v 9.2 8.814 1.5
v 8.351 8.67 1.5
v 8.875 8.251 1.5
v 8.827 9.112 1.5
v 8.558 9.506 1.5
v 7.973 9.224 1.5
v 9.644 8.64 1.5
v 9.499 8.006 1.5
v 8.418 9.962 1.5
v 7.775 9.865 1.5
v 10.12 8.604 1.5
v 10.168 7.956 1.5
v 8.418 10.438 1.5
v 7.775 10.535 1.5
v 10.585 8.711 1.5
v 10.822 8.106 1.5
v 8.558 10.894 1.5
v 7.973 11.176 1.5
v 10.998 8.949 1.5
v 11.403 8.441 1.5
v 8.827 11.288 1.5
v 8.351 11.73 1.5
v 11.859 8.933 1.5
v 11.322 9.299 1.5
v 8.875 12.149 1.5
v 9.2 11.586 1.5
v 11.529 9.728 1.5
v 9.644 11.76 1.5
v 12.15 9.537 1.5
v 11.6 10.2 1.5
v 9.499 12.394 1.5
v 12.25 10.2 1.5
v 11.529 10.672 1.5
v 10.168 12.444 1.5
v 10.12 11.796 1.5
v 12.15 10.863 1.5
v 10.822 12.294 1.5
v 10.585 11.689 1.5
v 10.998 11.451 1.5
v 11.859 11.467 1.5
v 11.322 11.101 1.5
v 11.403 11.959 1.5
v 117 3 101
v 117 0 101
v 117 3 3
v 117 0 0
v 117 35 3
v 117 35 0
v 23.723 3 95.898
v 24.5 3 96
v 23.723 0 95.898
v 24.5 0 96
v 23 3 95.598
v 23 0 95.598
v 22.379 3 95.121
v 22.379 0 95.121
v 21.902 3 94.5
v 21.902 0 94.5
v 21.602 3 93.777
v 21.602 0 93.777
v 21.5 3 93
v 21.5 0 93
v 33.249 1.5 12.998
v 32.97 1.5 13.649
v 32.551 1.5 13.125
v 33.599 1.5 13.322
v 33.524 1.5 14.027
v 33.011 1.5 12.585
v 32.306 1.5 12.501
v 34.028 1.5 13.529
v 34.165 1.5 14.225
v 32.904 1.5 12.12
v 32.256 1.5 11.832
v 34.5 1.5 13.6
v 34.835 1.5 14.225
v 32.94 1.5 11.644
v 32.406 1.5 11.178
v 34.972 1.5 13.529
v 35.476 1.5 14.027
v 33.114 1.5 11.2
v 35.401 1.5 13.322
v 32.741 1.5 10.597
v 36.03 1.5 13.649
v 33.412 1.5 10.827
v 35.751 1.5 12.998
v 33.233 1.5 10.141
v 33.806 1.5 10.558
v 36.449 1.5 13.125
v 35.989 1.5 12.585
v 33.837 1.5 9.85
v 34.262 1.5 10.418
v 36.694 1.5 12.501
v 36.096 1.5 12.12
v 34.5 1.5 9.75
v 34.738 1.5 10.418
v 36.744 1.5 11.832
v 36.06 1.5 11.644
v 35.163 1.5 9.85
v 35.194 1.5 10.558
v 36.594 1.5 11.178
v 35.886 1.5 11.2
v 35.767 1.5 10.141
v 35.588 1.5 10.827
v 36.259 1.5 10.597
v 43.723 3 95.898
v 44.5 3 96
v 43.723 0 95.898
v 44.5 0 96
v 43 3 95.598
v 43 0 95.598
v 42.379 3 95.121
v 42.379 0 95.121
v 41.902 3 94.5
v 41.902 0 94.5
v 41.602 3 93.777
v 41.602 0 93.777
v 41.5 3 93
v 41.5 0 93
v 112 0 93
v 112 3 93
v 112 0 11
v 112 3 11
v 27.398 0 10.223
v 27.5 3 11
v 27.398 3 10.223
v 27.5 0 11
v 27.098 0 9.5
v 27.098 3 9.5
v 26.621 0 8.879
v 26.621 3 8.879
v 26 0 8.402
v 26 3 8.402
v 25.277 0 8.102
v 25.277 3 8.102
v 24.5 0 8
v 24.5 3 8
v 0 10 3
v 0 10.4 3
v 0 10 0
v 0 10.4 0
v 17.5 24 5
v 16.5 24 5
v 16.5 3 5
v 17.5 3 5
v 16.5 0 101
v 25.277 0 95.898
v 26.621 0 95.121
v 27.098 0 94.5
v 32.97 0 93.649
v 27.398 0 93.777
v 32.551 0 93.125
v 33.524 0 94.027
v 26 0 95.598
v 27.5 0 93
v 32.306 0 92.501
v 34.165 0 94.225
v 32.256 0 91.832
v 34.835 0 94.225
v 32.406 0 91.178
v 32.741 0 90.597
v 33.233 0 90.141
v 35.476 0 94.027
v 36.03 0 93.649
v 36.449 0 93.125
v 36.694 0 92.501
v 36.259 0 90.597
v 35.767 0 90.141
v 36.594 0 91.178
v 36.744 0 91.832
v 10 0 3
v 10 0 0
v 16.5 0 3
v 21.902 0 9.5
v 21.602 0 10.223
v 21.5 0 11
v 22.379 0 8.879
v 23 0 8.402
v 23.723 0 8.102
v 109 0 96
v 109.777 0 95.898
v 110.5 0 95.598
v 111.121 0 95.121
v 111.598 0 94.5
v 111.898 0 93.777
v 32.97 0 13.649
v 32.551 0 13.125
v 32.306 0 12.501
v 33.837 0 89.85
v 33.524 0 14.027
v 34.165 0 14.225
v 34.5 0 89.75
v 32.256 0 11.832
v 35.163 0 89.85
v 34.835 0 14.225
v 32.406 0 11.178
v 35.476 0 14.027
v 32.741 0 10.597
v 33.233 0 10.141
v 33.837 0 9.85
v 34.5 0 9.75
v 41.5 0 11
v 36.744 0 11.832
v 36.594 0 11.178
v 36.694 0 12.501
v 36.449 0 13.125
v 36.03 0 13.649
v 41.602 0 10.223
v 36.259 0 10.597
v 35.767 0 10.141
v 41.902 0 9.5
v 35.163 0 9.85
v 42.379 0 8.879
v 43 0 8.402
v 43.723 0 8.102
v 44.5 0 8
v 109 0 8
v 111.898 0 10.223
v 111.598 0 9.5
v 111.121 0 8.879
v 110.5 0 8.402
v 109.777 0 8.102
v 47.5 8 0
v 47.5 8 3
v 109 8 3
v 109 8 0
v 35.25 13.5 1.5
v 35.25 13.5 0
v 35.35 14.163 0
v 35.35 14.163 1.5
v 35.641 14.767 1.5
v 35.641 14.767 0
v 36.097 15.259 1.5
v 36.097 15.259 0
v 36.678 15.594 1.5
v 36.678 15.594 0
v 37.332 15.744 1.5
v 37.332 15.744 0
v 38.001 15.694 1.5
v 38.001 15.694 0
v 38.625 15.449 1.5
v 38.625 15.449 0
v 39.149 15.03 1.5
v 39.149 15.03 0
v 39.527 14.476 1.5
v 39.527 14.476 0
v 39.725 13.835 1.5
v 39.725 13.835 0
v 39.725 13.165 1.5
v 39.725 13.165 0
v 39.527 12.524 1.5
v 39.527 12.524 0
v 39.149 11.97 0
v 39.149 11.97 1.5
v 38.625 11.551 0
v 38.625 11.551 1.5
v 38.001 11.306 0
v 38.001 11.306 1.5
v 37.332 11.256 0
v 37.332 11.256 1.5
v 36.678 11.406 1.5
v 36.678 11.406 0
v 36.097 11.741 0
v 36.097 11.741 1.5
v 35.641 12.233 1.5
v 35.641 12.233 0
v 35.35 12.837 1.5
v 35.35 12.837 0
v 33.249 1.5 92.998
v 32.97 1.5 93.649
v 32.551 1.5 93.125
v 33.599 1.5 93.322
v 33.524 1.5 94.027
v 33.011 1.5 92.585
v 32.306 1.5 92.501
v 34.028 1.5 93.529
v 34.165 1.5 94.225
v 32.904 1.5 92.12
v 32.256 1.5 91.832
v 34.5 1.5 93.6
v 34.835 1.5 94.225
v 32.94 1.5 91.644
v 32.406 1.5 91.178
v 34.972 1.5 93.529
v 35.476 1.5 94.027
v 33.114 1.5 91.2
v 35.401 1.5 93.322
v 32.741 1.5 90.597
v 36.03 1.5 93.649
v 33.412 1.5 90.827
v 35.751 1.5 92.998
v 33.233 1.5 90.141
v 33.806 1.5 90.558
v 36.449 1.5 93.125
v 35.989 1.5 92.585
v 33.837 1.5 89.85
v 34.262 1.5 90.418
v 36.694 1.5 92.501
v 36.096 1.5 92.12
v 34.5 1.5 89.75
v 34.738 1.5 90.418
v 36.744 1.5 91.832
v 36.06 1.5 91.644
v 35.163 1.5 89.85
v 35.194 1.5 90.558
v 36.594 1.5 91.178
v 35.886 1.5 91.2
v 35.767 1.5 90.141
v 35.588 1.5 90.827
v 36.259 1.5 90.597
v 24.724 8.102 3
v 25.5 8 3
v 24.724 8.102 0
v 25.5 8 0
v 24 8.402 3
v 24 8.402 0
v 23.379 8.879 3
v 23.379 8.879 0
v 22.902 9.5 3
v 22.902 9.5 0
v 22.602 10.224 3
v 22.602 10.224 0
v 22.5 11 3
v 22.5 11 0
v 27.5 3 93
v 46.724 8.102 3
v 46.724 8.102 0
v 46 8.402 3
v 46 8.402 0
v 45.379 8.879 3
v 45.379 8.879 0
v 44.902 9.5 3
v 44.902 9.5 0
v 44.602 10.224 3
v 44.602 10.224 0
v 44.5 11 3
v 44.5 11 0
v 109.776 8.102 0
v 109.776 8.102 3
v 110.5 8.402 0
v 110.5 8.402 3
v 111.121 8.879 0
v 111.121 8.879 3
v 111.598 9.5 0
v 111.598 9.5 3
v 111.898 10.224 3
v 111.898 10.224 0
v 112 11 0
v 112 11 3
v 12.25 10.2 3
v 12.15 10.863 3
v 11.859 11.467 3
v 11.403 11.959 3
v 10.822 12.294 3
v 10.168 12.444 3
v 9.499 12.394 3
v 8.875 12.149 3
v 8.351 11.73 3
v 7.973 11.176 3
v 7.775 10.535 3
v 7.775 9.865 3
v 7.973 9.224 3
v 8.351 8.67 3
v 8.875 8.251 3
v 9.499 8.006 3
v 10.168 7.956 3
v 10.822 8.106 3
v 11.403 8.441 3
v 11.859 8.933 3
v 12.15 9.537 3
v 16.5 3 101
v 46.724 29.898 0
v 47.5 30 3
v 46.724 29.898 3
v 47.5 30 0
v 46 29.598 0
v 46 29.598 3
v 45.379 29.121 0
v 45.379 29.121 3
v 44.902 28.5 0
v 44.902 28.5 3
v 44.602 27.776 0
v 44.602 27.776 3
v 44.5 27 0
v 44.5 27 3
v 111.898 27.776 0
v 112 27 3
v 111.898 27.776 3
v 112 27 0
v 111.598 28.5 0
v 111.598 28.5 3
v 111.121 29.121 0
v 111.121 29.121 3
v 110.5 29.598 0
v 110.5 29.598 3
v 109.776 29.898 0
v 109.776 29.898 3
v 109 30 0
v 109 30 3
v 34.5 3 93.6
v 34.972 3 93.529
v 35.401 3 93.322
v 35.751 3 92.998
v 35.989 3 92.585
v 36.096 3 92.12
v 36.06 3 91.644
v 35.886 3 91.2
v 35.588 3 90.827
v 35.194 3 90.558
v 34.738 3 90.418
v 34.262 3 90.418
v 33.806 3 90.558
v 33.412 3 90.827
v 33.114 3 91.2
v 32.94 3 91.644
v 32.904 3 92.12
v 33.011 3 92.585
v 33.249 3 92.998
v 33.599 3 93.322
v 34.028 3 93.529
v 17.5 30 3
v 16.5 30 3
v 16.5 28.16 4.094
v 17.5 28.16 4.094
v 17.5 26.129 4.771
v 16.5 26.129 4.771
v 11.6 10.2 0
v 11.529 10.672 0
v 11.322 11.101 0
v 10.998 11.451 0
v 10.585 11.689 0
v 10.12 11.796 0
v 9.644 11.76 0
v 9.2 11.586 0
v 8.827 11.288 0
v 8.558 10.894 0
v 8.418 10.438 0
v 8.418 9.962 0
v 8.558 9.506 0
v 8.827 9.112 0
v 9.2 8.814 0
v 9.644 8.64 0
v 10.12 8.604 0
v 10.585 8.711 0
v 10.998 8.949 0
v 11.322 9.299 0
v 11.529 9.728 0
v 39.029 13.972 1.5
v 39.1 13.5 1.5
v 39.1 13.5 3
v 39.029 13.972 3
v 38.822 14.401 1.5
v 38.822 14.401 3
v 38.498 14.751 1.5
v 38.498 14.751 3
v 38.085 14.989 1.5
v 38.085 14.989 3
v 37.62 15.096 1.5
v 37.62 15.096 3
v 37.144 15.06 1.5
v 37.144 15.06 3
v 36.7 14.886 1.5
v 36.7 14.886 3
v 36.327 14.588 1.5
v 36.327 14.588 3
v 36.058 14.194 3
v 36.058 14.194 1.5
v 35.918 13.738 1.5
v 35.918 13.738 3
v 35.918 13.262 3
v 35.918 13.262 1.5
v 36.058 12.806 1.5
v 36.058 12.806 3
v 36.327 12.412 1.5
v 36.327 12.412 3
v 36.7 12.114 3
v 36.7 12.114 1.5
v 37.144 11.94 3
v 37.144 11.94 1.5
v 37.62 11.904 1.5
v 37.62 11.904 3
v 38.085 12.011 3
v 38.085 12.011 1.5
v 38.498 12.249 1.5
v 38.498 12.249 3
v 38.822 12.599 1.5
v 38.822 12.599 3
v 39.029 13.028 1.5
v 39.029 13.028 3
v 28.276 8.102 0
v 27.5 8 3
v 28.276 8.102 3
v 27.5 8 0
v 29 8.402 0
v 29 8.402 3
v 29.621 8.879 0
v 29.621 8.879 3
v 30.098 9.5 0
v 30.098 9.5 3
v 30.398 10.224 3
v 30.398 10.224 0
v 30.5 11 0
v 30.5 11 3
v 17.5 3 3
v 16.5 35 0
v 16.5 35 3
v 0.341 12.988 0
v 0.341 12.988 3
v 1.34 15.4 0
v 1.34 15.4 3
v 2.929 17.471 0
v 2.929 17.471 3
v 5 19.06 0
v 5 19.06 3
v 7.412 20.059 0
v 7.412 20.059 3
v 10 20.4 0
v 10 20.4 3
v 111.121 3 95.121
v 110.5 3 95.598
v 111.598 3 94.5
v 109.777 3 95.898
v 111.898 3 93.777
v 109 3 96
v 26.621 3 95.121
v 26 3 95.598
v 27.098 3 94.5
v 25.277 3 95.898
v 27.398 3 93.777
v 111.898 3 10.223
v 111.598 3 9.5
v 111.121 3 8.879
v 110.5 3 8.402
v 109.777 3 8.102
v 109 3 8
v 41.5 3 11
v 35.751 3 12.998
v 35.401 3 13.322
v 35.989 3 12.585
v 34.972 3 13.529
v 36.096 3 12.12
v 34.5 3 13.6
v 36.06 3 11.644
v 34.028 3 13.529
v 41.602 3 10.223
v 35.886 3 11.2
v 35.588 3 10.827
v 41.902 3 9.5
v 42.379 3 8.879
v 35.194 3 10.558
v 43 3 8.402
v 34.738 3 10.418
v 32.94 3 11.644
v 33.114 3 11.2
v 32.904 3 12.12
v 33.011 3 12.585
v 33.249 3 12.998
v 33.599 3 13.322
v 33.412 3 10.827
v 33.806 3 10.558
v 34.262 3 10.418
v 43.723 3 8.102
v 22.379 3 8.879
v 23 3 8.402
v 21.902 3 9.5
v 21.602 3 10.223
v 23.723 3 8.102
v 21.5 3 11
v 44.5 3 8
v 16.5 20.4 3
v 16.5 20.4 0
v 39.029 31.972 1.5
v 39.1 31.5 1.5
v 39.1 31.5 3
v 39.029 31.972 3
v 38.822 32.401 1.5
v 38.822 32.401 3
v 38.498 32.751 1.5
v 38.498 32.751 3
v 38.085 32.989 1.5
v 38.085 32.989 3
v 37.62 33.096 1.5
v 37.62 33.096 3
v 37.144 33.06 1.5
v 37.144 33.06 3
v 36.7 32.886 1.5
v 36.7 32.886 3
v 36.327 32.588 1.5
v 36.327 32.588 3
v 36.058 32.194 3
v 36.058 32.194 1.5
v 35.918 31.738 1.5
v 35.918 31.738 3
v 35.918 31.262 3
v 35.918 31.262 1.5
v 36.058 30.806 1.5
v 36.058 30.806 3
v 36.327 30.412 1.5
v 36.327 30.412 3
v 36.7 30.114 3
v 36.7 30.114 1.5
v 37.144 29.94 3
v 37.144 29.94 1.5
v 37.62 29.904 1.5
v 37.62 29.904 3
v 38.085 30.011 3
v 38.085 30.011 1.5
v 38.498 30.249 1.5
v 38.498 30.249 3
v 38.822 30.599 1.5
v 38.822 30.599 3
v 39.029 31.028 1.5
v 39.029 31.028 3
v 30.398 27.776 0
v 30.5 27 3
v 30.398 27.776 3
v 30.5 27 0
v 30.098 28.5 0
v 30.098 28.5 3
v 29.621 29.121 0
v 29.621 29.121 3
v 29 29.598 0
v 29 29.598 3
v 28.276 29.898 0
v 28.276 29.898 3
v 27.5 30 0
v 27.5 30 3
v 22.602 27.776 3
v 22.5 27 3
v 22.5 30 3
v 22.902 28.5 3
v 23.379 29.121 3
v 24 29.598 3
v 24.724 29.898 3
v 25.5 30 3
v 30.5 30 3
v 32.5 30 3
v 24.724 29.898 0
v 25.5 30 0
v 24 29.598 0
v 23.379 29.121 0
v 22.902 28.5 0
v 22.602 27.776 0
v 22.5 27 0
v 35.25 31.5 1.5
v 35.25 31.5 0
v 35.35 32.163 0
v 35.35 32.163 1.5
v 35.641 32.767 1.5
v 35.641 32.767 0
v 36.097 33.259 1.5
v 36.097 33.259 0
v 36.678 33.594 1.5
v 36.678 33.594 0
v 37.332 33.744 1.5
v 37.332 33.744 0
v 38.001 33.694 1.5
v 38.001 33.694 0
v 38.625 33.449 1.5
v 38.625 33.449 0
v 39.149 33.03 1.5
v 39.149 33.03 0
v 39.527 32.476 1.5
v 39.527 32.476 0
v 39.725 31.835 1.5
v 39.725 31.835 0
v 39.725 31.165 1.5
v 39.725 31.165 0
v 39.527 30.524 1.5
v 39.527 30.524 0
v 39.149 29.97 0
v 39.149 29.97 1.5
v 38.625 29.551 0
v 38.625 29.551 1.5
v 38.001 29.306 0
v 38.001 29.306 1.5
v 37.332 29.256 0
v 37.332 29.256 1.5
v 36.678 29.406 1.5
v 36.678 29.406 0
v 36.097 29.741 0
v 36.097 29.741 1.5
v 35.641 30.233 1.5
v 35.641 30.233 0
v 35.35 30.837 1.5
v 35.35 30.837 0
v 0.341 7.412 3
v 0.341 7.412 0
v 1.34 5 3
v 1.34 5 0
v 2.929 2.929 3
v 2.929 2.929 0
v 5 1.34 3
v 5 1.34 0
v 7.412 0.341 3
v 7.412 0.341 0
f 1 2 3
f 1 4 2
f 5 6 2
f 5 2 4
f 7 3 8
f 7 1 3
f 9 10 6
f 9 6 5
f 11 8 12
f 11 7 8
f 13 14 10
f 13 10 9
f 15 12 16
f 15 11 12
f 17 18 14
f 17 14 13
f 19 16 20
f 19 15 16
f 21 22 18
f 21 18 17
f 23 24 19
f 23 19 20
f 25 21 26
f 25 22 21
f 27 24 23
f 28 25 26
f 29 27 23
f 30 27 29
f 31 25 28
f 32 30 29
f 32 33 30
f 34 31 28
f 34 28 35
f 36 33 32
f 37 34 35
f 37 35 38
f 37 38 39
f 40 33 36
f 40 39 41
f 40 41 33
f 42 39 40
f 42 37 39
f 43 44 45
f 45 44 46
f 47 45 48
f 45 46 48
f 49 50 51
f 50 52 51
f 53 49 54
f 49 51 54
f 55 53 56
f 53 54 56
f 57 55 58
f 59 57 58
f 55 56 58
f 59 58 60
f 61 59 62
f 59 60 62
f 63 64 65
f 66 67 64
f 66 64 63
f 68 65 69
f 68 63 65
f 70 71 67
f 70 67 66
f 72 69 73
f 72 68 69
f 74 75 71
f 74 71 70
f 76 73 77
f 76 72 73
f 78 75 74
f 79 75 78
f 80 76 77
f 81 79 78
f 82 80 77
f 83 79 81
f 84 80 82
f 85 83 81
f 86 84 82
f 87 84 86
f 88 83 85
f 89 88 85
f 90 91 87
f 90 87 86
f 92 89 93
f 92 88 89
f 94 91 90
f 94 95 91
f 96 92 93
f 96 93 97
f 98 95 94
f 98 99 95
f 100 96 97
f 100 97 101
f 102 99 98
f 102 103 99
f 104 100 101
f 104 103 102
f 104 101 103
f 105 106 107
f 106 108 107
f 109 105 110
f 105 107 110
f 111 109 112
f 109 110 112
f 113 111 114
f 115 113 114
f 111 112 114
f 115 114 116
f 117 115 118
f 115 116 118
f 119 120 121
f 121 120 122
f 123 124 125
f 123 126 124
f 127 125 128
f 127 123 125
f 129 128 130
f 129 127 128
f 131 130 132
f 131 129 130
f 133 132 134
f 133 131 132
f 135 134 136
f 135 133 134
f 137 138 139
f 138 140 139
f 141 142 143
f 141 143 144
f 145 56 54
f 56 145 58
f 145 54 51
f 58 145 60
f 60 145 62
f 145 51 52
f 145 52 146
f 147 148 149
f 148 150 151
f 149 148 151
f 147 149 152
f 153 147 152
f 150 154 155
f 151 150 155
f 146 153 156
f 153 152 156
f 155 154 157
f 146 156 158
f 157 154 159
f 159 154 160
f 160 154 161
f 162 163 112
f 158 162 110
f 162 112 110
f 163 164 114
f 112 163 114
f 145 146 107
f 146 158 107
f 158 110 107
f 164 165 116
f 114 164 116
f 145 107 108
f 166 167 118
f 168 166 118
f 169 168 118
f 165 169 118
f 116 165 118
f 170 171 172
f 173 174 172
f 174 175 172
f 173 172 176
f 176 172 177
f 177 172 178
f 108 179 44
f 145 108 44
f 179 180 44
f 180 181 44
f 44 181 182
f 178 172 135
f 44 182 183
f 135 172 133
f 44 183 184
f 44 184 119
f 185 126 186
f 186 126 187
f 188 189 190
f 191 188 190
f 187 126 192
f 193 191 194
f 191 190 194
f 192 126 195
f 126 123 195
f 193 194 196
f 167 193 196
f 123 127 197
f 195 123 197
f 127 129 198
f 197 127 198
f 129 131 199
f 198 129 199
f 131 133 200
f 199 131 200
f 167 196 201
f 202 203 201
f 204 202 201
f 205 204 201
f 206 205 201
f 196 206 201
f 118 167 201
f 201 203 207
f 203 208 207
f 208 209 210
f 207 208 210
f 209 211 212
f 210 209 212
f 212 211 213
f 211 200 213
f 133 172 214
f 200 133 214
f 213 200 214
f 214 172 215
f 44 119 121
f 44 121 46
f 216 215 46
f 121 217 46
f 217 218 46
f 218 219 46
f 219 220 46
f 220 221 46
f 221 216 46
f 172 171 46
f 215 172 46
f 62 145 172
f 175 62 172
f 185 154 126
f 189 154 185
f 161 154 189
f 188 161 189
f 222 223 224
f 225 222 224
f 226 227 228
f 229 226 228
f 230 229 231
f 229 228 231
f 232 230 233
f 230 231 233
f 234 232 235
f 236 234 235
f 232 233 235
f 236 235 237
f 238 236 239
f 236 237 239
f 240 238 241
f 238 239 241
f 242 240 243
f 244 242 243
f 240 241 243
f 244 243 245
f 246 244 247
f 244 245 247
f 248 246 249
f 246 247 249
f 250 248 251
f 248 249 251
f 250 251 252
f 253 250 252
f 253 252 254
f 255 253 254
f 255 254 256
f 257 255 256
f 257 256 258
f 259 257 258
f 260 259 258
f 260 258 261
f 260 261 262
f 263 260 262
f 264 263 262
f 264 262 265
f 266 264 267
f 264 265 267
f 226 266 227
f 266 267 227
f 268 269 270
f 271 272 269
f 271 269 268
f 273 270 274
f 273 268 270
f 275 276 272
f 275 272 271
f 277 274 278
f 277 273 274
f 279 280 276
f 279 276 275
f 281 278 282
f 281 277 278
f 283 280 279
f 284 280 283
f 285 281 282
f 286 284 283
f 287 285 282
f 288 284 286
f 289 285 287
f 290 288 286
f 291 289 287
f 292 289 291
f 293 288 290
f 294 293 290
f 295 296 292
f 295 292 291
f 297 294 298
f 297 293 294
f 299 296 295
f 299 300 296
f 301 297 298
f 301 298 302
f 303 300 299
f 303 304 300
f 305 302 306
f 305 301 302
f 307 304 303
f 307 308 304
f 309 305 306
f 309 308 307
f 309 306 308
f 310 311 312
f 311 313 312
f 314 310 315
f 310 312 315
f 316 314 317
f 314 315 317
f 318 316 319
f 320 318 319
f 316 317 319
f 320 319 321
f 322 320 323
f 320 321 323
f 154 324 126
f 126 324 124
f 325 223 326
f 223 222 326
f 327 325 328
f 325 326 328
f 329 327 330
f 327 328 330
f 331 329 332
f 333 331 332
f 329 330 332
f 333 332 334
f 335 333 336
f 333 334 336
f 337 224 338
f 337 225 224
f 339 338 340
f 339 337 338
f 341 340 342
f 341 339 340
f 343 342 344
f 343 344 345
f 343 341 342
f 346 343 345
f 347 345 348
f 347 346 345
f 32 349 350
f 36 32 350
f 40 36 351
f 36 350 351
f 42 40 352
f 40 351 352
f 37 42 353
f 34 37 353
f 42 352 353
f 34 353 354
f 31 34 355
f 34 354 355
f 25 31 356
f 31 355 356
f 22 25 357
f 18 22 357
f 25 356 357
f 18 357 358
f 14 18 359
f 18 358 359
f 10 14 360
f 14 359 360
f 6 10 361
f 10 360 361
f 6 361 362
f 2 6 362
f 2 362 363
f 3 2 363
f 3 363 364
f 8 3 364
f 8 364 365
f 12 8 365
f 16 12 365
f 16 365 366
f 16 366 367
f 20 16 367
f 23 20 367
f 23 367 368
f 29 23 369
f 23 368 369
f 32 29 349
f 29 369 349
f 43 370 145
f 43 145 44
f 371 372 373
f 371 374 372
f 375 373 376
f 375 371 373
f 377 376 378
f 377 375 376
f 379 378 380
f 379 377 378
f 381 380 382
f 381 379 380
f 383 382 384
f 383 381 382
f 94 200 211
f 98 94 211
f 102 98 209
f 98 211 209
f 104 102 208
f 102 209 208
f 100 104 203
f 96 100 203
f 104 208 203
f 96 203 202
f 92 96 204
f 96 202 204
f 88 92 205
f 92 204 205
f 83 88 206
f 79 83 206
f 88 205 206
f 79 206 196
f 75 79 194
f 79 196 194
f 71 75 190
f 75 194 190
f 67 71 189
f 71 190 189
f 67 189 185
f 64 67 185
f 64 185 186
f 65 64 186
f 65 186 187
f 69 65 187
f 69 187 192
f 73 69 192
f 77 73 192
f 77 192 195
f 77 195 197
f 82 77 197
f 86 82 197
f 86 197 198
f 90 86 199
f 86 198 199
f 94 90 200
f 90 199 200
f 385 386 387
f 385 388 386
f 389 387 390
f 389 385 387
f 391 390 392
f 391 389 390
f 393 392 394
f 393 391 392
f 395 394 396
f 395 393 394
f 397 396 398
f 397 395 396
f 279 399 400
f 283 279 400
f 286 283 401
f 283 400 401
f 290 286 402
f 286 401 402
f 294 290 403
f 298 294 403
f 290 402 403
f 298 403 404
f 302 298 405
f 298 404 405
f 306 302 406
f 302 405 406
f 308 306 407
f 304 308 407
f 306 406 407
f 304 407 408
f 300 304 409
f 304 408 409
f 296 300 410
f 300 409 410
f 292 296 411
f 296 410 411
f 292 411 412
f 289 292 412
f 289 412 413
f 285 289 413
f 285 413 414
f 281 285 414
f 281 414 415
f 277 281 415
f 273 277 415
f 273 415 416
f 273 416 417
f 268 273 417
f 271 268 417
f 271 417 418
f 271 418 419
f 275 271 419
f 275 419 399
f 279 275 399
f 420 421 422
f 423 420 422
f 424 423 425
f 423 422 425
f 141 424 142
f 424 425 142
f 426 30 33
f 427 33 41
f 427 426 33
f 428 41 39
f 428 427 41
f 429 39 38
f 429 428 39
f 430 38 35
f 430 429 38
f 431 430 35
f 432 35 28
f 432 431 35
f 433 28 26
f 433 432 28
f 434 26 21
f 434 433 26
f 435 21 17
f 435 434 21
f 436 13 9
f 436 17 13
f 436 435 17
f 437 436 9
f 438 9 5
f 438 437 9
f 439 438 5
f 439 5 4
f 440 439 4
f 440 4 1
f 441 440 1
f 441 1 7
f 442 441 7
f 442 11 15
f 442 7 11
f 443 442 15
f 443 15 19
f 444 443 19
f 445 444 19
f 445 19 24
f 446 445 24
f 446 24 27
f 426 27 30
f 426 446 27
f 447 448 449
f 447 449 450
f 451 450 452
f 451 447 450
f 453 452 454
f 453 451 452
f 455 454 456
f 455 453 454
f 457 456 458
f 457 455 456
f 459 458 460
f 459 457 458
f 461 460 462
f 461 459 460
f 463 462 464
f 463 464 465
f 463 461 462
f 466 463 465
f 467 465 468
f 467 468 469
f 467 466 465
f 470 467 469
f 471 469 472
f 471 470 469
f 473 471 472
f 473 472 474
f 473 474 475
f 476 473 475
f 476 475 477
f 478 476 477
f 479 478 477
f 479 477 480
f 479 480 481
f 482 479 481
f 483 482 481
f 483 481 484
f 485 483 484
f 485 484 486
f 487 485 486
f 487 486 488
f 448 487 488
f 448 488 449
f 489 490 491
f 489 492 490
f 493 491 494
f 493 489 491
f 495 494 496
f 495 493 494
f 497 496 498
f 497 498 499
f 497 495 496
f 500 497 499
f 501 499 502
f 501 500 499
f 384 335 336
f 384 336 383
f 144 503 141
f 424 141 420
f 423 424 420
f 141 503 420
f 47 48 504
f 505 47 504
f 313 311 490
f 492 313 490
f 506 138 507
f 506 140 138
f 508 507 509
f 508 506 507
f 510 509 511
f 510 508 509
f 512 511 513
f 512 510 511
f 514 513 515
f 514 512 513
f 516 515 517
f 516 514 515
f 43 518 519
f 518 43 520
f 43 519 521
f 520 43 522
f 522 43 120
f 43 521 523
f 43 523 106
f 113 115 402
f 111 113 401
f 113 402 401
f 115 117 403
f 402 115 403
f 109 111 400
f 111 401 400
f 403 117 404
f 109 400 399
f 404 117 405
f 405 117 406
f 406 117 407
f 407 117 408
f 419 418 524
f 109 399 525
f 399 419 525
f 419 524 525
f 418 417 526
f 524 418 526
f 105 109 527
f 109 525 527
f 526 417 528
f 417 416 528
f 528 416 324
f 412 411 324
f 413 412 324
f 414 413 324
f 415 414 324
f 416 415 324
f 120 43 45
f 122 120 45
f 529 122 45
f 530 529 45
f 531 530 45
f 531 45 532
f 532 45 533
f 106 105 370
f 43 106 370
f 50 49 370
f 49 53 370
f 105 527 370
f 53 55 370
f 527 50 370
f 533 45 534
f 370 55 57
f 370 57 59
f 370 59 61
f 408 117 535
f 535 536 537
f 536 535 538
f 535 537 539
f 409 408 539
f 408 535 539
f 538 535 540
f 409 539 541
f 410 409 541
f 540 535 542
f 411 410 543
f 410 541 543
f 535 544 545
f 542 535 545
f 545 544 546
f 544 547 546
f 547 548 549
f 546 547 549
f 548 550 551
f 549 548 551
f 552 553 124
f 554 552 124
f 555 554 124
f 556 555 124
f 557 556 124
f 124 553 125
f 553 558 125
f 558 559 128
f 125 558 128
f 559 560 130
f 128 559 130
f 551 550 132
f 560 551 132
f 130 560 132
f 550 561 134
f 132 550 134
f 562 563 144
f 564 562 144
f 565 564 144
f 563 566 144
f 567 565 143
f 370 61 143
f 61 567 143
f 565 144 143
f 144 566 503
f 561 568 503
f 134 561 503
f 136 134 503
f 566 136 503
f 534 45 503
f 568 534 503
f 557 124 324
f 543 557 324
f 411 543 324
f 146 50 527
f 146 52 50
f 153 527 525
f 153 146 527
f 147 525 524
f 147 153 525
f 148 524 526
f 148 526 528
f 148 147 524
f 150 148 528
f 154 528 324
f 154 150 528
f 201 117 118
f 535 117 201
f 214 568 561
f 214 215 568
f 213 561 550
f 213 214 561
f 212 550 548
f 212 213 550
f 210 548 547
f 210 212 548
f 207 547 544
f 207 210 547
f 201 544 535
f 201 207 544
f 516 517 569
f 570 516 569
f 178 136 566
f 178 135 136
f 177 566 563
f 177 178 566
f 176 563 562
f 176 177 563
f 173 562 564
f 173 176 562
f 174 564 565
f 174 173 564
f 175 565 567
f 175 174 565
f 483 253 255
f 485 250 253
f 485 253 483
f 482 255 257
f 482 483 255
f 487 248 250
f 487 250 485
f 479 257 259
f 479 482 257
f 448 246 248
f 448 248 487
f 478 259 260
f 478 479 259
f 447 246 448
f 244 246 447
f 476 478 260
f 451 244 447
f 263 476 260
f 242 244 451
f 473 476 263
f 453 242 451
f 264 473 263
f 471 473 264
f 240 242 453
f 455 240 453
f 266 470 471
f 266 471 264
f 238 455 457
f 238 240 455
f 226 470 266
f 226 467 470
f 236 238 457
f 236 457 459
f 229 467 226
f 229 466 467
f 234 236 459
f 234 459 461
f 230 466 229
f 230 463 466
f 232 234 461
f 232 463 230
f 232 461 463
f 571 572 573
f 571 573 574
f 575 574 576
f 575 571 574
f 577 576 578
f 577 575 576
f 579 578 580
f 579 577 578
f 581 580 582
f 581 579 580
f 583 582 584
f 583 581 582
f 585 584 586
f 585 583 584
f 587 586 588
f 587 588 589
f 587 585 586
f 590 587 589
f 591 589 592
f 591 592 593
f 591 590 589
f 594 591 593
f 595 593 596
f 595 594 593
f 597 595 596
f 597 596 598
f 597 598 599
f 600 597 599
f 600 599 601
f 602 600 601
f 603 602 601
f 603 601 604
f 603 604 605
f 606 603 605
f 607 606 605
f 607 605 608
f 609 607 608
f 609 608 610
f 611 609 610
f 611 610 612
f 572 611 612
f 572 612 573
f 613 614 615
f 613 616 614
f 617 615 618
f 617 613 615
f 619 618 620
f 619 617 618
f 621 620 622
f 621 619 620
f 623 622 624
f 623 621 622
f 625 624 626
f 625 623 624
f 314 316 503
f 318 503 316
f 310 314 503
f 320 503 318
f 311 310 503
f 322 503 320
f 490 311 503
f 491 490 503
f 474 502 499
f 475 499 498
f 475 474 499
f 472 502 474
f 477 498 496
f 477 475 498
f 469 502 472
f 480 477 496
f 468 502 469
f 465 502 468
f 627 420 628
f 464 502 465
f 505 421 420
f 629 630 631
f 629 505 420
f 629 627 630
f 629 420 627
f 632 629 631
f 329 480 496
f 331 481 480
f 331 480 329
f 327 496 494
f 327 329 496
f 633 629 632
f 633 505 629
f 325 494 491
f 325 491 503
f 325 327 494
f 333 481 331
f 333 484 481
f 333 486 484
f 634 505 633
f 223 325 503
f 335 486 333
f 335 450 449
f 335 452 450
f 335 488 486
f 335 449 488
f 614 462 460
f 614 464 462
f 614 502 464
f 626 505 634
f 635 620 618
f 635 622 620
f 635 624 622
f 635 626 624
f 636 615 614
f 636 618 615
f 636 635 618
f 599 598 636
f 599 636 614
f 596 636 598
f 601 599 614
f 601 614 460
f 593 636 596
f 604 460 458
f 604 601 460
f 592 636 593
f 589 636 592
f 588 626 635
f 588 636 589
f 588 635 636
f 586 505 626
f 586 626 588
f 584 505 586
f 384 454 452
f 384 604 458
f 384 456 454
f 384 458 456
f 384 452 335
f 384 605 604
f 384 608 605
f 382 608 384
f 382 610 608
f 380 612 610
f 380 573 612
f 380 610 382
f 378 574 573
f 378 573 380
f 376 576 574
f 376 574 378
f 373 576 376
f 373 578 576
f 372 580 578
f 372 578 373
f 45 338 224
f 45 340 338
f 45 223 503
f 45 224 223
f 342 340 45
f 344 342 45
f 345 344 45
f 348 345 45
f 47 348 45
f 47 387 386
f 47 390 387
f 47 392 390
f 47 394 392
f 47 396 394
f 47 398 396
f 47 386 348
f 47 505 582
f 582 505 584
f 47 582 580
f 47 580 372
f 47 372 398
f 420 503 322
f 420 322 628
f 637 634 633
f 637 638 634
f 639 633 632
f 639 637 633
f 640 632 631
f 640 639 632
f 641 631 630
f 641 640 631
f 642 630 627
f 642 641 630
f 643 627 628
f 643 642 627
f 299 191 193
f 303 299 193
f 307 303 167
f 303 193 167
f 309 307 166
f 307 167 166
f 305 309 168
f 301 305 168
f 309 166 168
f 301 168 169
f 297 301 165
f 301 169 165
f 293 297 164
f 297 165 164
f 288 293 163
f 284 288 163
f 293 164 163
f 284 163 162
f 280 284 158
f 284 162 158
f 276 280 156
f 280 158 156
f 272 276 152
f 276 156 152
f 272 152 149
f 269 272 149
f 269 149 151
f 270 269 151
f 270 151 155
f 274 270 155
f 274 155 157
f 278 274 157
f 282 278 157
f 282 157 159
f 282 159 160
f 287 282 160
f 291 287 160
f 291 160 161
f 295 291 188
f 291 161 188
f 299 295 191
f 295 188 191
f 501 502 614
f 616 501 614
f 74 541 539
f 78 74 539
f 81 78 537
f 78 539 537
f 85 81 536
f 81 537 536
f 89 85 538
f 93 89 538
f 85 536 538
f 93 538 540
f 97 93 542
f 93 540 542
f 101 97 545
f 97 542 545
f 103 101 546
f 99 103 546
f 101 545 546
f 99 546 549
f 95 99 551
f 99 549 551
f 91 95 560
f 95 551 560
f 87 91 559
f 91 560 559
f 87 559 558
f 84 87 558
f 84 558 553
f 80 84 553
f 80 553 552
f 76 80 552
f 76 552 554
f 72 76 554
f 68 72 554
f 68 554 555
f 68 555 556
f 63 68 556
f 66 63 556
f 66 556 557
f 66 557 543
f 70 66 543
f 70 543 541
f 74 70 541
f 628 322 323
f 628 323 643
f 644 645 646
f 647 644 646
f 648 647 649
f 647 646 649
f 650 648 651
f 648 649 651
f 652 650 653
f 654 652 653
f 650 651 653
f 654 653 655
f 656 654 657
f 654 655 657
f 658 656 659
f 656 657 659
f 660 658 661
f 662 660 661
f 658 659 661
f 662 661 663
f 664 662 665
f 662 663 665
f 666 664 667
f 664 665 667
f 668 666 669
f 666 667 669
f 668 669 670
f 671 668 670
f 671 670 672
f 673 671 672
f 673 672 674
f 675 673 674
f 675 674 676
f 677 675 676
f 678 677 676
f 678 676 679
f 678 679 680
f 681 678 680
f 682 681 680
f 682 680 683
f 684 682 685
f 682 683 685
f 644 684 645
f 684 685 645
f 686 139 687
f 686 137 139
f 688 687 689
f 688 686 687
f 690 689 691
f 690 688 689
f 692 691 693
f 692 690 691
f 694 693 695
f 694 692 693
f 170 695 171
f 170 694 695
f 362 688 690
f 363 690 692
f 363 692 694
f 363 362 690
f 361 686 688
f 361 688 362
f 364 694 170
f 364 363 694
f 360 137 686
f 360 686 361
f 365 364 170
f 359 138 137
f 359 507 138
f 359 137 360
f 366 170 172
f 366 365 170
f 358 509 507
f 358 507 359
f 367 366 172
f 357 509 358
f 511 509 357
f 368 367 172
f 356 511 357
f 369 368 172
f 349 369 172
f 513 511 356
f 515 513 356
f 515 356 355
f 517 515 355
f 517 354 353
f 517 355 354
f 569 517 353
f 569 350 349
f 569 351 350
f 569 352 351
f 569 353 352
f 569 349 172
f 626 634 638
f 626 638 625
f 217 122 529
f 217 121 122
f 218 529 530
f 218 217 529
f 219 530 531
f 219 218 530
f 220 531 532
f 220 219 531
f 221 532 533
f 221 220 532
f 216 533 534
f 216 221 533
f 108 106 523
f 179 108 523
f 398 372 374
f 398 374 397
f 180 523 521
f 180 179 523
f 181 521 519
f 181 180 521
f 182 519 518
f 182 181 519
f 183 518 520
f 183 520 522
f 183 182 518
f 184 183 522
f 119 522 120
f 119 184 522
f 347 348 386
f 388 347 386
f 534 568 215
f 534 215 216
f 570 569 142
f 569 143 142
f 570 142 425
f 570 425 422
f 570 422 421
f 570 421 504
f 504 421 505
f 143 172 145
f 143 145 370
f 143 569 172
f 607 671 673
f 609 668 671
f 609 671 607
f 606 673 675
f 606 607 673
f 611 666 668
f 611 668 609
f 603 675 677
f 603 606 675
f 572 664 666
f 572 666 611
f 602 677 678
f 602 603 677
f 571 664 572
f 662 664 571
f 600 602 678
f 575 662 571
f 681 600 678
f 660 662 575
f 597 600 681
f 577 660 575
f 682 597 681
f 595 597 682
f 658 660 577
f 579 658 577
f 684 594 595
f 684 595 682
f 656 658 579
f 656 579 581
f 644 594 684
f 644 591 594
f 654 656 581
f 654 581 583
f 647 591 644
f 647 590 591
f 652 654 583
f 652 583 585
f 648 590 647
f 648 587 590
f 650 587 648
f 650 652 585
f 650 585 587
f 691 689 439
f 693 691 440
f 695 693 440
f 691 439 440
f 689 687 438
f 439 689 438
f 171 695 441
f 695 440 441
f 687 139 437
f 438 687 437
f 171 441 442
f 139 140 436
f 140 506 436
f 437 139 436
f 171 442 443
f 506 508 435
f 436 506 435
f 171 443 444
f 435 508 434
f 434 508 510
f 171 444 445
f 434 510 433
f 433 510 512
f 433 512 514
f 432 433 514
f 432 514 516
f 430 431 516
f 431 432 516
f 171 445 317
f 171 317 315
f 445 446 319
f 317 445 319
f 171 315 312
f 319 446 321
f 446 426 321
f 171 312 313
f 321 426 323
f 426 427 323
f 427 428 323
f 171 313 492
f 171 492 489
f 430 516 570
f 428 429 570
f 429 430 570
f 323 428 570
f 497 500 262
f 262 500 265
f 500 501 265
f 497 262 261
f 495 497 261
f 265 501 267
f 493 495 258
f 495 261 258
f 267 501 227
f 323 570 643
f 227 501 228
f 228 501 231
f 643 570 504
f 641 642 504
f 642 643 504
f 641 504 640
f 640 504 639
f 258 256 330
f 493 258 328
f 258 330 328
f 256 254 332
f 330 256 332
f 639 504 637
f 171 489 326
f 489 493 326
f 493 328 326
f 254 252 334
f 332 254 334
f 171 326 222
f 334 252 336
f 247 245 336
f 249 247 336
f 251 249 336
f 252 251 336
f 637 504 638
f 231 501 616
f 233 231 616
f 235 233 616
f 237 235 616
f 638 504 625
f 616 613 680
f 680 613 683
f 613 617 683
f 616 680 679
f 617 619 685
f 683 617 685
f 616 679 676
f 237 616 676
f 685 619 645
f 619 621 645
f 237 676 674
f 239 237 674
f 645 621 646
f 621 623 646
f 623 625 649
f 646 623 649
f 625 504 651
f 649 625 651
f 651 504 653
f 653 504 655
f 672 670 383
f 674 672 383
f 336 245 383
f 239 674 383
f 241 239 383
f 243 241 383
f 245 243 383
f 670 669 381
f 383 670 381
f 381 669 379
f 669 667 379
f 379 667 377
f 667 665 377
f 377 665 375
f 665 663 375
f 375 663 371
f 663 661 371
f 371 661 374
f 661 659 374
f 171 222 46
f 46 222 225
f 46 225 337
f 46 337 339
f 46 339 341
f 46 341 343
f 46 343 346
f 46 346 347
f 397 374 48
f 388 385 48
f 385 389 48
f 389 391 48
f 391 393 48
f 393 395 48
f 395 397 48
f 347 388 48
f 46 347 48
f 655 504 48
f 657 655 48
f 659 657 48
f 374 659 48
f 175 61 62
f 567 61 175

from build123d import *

# Parameters (mm, degrees)
SKETCH1_R           = 1.6
SKETCH1_W           = 1
SKETCH1_H           = 27
BOSS_EXTRUDE1_DEPTH = 3
SKETCH1_3_W         = 1
SKETCH1_3_H         = 27
BOSS_EXTRUDE2_DEPTH = 5
BOSS_EXTRUDE3_DEPTH = 101
SKETCH2_R           = 2.25
CUT_EXTRUDE1_DEPTH  = 1.5
SKETCH4_R           = 2.25
CUT_EXTRUDE2_DEPTH  = 1.5
SKETCH5_R           = 1.6
CUT_EXTRUDE3_DEPTH  = 3
SKETCH6_R           = 2.25
CUT_EXTRUDE4_DEPTH  = 1.5
SKETCH7_W           = 16.5
SKETCH7_H           = 98
CUT_EXTRUDE5_DEPTH  = 3
SKETCH8_W           = 16.5
SKETCH8_H           = 14.6
CUT_EXTRUDE6_DEPTH  = 3
FILLET1_R           = 10
FILLET2_R           = 10
FILLET3_R           = 10
SKETCH9_W           = 67.5
SKETCH9_H           = 22
SKETCH9_W_2         = 8
CUT_EXTRUDE7_DEPTH  = 10
FILLET4_R           = 3
SKETCH10_W          = 70.5
SKETCH10_H          = 88
SKETCH10_W_2        = 6
CUT_EXTRUDE8_DEPTH  = 10
FILLET5_R           = 3


# Some blends are built 0.0001 mm under size
with BuildPart() as part:
    # Sketch1 → Boss-Extrude1 (new body)
    # profile 1 of 3: a face of its own
    with BuildSketch(Plane.XY):
        Polygon((0, 3), (0, 0), (117, 0), (117, 3), (17.5, 3), (16.5, 3), align=None)
    # profile 2 of 3: a face of its own
    with BuildSketch(Plane.XY):
        Polygon((0, 35), (0, 3), (16.5, 3), (16.5, 30), (17.5, 30), (17.5, 3), (117, 3), (117, 35), align=None)
        with Locations((10, 10.2)):
            Circle(SKETCH1_R, mode=Mode.SUBTRACT)
        with Locations((37.5, 13.5)):
            Circle(SKETCH1_R, mode=Mode.SUBTRACT)
        with Locations((37.5, 31.5)):
            Circle(SKETCH1_R, mode=Mode.SUBTRACT)
    # profile 3 of 3: a face of its own
    with BuildSketch(Plane.XY):
        with Locations((17, 16.5)):
            Rectangle(SKETCH1_W, SKETCH1_H)
    extrude(amount=BOSS_EXTRUDE1_DEPTH)

    # Sketch1<3> → Boss-Extrude2 (add)
    with BuildSketch(Plane.XY):
        with Locations((17, 16.5)):
            Rectangle(SKETCH1_3_W, SKETCH1_3_H)
    extrude(amount=BOSS_EXTRUDE2_DEPTH)

    # Sketch1<7> → Boss-Extrude3 (add)
    with BuildSketch(Plane.XY):
        Polygon((0, 3), (0, 0), (117, 0), (117, 3), (17.5, 3), (16.5, 3), align=None)
    extrude(amount=BOSS_EXTRUDE3_DEPTH)

    # Sketch2 → Cut-Extrude1 (cut)
    with BuildSketch(Plane(origin=(0, 0, 0), x_dir=(-1, 0, 0), z_dir=(0, 0, -1))):
        with Locations((-37.5, 31.5)):
            Circle(SKETCH2_R)
        with Locations((-37.5, 13.5)):
            Circle(SKETCH2_R)
    extrude(amount=-CUT_EXTRUDE1_DEPTH, mode=Mode.SUBTRACT)

    # Sketch4 → Cut-Extrude2 (cut)
    with BuildSketch(Plane.XY.offset(3)):
        with Locations((10, 10.2)):
            Circle(SKETCH4_R)
    extrude(amount=-CUT_EXTRUDE2_DEPTH, mode=Mode.SUBTRACT)

    # Sketch5 → Cut-Extrude3 (cut)
    with BuildSketch(Plane(origin=(0, 3, 0), x_dir=(1, 0, 0), z_dir=(0, 1, 0))):
        with Locations(Location((34.5, -12, 0), (0, 0, 270))):
            Circle(SKETCH5_R)
        with Locations(Location((34.5, -92, 0), (0, 0, 270))):
            Circle(SKETCH5_R)
    extrude(amount=-CUT_EXTRUDE3_DEPTH, mode=Mode.SUBTRACT)

    # Sketch6 → Cut-Extrude4 (cut)
    with BuildSketch(Plane.XZ):
        with Locations(Location((34.5, 92, 0), (0, 0, 270))):
            Circle(SKETCH6_R)
        with Locations(Location((34.5, 12, 0), (0, 0, 270))):
            Circle(SKETCH6_R)
    extrude(amount=-CUT_EXTRUDE4_DEPTH, mode=Mode.SUBTRACT)

    # Sketch7 → Cut-Extrude5 (cut)
    with BuildSketch(Plane(origin=(0, 3, 0), x_dir=(1, 0, 0), z_dir=(0, 1, 0))):
        with Locations((8.25, -52)):
            Rectangle(SKETCH7_W, SKETCH7_H)
    extrude(amount=-CUT_EXTRUDE5_DEPTH, mode=Mode.SUBTRACT)

    # Sketch8 → Cut-Extrude6 (cut)
    with BuildSketch(Plane.XY.offset(3)):
        with Locations((8.25, 27.7)):
            Rectangle(SKETCH8_W, SKETCH8_H)
    extrude(amount=-CUT_EXTRUDE6_DEPTH, mode=Mode.SUBTRACT)

    # Fillet1
    fillet1_edges = [part.edges().sort_by_distance(p)[0] for p in [
        (0, 20.4, 1.5),
    ]]
    fillet(fillet1_edges, radius=FILLET1_R)

    # Fillet2
    fillet2_edges = [part.edges().sort_by_distance(p)[0] for p in [
        (0, 0, 1.5),
    ]]
    fillet(fillet2_edges, radius=FILLET2_R)

    # Fillet3
    # the kernel refuses this fillet: 10 mm, written as the material it takes off along each edge
    with BuildSketch(Plane(origin=(1.5, 30, 5), x_dir=(0, 0, -1), z_dir=(1, 0, 0))) as fillet3_piece_1:
        with BuildLine():
            CenterArc((10, -6), FILLET3_R, 143.130102354, 36.869897646)
            Line((0, -6), (-0.2, -6))
            Line((-0.2, -6), (-0.2, 0))
            Line((-0.2, 0), (0, 0.2))
            ThreePointArc((0, 0.2), (1, 0.2), (1.84, 0.12))
            Line((1.84, 0.12), (2, 0))
        make_face()
    extrude(amount=31, mode=Mode.SUBTRACT)

    # Sketch9 → Cut-Extrude7 (cut)
    with BuildSketch(Plane.XY.offset(3)):
        with Locations((78.25, 19)):
            Rectangle(SKETCH9_W, SKETCH9_H)
        with Locations((26.5, 19)):
            Rectangle(SKETCH9_W_2, SKETCH9_H)
    extrude(amount=-CUT_EXTRUDE7_DEPTH, mode=Mode.SUBTRACT)

    # Fillet4
    fillet4_edges = [part.edges().sort_by_distance(p)[0] for p in [
        (44.5, 8, 1.5),
        (44.5, 30, 1.5),
        (112, 30, 1.5),
        (112, 8, 1.5),
        (22.5, 8, 1.5),
        (22.5, 30, 1.5),
        (30.5, 30, 1.5),
        (30.5, 8, 1.5),
    ]]
    fillet(fillet4_edges, radius=FILLET4_R)

    # Sketch10 → Cut-Extrude8 (cut)
    with BuildSketch(Plane(origin=(0, 3, 0), x_dir=(1, 0, 0), z_dir=(0, 1, 0))):
        with Locations((76.75, -52)):
            Rectangle(SKETCH10_W, SKETCH10_H)
        with Locations((24.5, -52)):
            Rectangle(SKETCH10_W_2, SKETCH10_H)
    extrude(amount=-CUT_EXTRUDE8_DEPTH, mode=Mode.SUBTRACT)

    # Fillet5
    fillet5_edges = [part.edges().sort_by_distance(p)[0] for p in [
        (41.5, 1.5, 96),
        (41.5, 1.5, 8),
        (112, 1.5, 8),
        (112, 1.5, 96),
        (21.5, 1.5, 96),
        (21.5, 1.5, 8),
        (27.5, 1.5, 8),
        (27.5, 1.5, 96),
    ]]
    fillet(fillet5_edges, radius=FILLET5_R - 0.0001)  # a hair under: the kernel refuses the full size


solid = part.part
